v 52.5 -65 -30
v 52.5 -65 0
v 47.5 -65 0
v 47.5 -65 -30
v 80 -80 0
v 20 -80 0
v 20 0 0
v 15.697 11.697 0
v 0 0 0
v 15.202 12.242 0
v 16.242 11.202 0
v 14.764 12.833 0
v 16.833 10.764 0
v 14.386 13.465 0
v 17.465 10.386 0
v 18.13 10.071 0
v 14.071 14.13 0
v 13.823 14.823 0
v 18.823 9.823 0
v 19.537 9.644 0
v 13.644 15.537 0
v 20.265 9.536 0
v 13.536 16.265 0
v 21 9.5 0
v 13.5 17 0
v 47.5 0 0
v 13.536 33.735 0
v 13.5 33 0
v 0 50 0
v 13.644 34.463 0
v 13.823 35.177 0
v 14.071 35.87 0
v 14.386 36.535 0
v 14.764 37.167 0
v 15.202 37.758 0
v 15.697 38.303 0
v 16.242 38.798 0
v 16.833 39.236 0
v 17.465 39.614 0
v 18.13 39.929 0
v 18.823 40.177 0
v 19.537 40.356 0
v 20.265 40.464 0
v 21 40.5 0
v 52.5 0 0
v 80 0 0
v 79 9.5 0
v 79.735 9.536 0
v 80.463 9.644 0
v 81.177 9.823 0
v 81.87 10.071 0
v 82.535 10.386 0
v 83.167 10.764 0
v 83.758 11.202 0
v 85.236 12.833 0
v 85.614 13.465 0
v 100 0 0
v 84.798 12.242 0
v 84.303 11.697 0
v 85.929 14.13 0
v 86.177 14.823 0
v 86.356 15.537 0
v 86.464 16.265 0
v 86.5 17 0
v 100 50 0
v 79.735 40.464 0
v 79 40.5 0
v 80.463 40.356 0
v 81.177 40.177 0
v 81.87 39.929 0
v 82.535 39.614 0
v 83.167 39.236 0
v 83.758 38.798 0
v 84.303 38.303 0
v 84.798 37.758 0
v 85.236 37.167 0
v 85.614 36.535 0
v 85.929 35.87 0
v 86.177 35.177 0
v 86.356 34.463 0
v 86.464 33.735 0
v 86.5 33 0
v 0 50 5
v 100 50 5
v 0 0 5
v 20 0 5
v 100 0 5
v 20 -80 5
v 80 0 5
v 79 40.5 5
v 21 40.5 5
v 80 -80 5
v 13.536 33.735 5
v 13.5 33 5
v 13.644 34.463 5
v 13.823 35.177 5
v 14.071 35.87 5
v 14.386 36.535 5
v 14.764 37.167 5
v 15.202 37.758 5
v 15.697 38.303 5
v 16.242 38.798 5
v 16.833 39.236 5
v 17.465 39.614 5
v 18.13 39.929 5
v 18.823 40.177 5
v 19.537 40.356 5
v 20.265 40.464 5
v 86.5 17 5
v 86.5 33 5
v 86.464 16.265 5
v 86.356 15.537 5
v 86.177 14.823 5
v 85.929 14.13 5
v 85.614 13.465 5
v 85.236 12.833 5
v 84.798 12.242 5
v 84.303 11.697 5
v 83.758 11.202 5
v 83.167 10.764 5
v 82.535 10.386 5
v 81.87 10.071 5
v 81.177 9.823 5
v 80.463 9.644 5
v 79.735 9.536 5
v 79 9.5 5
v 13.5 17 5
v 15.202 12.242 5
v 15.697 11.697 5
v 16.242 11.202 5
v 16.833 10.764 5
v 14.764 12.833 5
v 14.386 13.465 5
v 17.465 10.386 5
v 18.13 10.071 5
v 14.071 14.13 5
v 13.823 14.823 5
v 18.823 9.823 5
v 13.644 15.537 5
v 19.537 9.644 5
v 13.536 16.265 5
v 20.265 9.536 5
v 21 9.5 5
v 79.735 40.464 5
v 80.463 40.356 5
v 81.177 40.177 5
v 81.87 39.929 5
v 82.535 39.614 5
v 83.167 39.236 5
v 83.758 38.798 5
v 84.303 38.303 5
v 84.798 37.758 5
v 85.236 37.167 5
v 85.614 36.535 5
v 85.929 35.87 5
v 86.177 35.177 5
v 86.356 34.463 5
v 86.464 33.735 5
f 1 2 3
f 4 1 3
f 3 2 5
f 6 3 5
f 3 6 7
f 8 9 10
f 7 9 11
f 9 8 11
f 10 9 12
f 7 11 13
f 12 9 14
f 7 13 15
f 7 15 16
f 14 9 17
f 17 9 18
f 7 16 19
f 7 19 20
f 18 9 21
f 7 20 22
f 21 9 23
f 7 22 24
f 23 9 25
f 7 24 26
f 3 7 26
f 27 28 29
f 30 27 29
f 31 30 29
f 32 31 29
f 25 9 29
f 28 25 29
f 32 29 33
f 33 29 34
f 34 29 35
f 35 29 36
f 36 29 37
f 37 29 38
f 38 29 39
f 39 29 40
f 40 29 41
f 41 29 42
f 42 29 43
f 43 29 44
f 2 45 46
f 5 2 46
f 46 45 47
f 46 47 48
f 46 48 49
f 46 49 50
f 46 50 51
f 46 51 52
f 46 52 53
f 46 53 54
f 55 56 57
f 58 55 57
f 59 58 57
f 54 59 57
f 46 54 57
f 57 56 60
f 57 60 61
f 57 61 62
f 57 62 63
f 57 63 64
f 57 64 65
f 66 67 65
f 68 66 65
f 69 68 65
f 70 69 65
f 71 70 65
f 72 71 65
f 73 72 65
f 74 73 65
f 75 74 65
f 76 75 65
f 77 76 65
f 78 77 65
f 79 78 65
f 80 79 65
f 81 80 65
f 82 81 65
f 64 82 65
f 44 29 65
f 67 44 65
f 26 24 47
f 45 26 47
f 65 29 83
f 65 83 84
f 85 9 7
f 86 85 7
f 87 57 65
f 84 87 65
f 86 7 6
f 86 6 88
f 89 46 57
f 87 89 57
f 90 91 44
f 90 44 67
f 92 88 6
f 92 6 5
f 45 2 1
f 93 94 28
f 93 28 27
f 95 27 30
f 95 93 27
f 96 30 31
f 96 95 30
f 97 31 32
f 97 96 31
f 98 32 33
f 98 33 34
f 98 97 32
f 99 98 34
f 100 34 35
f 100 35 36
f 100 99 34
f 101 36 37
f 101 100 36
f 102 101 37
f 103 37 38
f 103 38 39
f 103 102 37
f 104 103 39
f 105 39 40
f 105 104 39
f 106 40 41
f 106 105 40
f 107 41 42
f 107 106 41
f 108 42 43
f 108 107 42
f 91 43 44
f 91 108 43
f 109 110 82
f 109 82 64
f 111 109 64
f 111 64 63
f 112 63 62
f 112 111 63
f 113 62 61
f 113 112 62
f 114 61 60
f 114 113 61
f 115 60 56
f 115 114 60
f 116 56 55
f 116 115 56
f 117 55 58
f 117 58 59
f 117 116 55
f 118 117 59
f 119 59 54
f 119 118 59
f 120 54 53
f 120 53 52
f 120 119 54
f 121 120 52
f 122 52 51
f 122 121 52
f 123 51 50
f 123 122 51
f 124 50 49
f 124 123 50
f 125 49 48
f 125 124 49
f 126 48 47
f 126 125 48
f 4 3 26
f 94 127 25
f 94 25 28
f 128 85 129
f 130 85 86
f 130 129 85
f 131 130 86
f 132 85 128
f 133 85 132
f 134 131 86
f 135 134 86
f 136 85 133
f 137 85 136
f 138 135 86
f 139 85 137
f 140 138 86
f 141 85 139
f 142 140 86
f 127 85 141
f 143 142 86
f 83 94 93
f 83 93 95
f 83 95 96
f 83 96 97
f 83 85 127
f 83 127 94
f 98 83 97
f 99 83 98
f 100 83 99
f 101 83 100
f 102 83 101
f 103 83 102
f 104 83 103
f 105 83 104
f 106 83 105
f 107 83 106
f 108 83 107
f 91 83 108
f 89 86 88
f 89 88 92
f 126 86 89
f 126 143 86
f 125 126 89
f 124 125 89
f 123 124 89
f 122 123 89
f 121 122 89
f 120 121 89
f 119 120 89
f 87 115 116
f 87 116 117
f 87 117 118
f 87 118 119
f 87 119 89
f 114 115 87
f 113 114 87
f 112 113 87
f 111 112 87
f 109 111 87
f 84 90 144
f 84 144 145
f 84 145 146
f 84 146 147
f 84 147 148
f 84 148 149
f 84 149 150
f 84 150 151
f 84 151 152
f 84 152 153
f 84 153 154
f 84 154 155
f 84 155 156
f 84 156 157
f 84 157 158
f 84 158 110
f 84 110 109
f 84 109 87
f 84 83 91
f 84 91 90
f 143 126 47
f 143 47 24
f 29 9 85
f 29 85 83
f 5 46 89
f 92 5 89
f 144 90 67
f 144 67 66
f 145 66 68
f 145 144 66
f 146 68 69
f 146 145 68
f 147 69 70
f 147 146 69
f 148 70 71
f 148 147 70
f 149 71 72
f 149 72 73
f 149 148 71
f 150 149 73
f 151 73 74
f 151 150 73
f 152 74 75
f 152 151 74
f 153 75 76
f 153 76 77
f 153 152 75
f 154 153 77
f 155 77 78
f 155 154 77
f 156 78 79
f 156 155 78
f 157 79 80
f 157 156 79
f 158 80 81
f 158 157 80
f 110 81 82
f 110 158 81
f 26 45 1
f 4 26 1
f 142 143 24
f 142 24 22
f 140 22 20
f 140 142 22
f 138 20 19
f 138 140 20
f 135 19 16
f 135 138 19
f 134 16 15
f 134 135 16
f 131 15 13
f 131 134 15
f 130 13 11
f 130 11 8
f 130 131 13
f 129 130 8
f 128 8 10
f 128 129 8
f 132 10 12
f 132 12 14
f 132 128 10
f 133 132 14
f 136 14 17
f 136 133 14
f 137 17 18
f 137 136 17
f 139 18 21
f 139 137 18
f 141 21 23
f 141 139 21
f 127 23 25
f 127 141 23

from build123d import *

# Parameters (mm, degrees)
SKETCH1_W           = 100
SKETCH1_H           = 50
BOSS_EXTRUDE1_DEPTH = 5
CUT_EXTRUDE1_DEPTH  = 5
SKETCH3_W           = 60
SKETCH3_H           = 5
BOSS_EXTRUDE2_DEPTH = 80
SKETCH6_W           = 5
SKETCH6_H           = 65
BOSS_EXTRUDE4_DEPTH = 30
CUT_EXTRUDE3_DEPTH  = 5


with BuildPart() as part:
    # Sketch1 → Boss-Extrude1 (new body)
    with BuildSketch(Plane.XY):
        with Locations((50, 25)):
            Rectangle(SKETCH1_W, SKETCH1_H)
    extrude(amount=BOSS_EXTRUDE1_DEPTH)

    # Sketch2 → Cut-Extrude1 (cut)
    with BuildSketch(Plane.XY.offset(5)):
        with BuildLine():
            Line((21, 40.5), (79, 40.5))
            ThreePointArc((79, 40.5), (84.303300859, 38.303300859), (86.5, 33))
            Line((86.5, 33), (86.5, 17))
            ThreePointArc((86.5, 17), (84.303300859, 11.696699141), (79, 9.5))
            Line((79, 9.5), (21, 9.5))
            ThreePointArc((21, 9.5), (15.696699141, 11.696699141), (13.5, 17))
            Line((13.5, 17), (13.5, 33))
            ThreePointArc((13.5, 33), (15.696699141, 38.303300859), (21, 40.5))
        make_face()
    extrude(amount=-CUT_EXTRUDE1_DEPTH, mode=Mode.SUBTRACT)

    # Sketch3 → Boss-Extrude2 (add)
    with BuildSketch(Plane.XZ):
        with Locations((50, 2.5)):
            Rectangle(SKETCH3_W, SKETCH3_H)
    extrude(amount=BOSS_EXTRUDE2_DEPTH)

    # Sketch6 → Boss-Extrude4 (add)
    with BuildSketch(Plane(origin=(0, 0, 0), x_dir=(-1, 0, 0), z_dir=(0, 0, -1))):
        with Locations((-50, -32.5)):
            Rectangle(SKETCH6_W, SKETCH6_H)
    extrude(amount=BOSS_EXTRUDE4_DEPTH)

    # Sketch7 → Cut-Extrude3 (cut)
    with BuildSketch(Plane(origin=(52.5, 0, 0), x_dir=(0, 0, -1), z_dir=(1, 0, 0))):
        Polygon((0, 0), (30, -65), (30, 0), align=None)
    extrude(amount=-CUT_EXTRUDE3_DEPTH, mode=Mode.SUBTRACT)


solid = part.part
